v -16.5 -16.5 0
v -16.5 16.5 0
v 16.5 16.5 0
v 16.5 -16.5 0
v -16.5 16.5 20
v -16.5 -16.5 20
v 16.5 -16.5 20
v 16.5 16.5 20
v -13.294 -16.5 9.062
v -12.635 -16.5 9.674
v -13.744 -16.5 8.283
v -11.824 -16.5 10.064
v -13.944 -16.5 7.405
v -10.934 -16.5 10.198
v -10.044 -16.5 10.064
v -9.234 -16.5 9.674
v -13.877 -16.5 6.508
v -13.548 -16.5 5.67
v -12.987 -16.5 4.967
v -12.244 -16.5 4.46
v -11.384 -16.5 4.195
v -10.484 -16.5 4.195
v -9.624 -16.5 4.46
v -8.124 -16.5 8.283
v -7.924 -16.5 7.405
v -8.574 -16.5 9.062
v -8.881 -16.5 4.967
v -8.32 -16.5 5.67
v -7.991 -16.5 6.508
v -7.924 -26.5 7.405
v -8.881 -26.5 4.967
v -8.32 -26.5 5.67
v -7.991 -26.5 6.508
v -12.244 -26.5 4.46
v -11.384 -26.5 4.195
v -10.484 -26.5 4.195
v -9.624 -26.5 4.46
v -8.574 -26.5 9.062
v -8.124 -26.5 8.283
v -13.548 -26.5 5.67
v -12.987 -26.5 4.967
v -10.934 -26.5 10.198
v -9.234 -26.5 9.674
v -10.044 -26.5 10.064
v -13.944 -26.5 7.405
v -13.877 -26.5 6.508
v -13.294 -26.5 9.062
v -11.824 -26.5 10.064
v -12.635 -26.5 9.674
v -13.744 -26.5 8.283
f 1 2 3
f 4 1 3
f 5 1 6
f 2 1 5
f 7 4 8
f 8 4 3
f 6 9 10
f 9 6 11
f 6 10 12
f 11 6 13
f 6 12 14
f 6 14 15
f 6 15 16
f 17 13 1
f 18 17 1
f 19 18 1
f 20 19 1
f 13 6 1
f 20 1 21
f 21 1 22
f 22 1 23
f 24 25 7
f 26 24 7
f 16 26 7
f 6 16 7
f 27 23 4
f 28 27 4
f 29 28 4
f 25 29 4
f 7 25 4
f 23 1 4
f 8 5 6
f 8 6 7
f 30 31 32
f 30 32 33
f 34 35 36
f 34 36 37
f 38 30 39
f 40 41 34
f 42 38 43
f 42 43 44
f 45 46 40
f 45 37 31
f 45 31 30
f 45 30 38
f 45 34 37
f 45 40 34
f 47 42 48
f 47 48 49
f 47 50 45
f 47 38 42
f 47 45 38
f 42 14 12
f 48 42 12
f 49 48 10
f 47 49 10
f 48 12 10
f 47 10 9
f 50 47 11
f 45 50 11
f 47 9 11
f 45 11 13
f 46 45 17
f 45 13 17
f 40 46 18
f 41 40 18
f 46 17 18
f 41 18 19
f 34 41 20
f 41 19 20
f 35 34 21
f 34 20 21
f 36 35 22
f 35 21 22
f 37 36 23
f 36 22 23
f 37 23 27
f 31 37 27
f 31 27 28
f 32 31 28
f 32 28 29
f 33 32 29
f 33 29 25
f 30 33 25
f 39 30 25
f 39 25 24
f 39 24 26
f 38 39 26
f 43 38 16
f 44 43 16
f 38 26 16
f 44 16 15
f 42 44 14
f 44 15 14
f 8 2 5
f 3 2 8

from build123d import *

# Parameters (mm, degrees)
SKETCH1_W           = 33
SKETCH1_H           = 33
BOSS_EXTRUDE1_DEPTH = 20
SKETCH2_R           = 3.018628297
BOSS_EXTRUDE2_DEPTH = 10


with BuildPart() as part:
    # Sketch1 → Boss-Extrude1 (new body)
    with BuildSketch(Plane.XY):
        Rectangle(SKETCH1_W, SKETCH1_H)
    extrude(amount=BOSS_EXTRUDE1_DEPTH)

    # Sketch2 → Boss-Extrude2 (add)
    with BuildSketch(Plane.XZ.offset(16.5)):
        with Locations(Location((-10.934193972, 7.179785009, 0), (0, 0, 90))):
            Circle(SKETCH2_R)
    extrude(amount=BOSS_EXTRUDE2_DEPTH)


solid = part.part
